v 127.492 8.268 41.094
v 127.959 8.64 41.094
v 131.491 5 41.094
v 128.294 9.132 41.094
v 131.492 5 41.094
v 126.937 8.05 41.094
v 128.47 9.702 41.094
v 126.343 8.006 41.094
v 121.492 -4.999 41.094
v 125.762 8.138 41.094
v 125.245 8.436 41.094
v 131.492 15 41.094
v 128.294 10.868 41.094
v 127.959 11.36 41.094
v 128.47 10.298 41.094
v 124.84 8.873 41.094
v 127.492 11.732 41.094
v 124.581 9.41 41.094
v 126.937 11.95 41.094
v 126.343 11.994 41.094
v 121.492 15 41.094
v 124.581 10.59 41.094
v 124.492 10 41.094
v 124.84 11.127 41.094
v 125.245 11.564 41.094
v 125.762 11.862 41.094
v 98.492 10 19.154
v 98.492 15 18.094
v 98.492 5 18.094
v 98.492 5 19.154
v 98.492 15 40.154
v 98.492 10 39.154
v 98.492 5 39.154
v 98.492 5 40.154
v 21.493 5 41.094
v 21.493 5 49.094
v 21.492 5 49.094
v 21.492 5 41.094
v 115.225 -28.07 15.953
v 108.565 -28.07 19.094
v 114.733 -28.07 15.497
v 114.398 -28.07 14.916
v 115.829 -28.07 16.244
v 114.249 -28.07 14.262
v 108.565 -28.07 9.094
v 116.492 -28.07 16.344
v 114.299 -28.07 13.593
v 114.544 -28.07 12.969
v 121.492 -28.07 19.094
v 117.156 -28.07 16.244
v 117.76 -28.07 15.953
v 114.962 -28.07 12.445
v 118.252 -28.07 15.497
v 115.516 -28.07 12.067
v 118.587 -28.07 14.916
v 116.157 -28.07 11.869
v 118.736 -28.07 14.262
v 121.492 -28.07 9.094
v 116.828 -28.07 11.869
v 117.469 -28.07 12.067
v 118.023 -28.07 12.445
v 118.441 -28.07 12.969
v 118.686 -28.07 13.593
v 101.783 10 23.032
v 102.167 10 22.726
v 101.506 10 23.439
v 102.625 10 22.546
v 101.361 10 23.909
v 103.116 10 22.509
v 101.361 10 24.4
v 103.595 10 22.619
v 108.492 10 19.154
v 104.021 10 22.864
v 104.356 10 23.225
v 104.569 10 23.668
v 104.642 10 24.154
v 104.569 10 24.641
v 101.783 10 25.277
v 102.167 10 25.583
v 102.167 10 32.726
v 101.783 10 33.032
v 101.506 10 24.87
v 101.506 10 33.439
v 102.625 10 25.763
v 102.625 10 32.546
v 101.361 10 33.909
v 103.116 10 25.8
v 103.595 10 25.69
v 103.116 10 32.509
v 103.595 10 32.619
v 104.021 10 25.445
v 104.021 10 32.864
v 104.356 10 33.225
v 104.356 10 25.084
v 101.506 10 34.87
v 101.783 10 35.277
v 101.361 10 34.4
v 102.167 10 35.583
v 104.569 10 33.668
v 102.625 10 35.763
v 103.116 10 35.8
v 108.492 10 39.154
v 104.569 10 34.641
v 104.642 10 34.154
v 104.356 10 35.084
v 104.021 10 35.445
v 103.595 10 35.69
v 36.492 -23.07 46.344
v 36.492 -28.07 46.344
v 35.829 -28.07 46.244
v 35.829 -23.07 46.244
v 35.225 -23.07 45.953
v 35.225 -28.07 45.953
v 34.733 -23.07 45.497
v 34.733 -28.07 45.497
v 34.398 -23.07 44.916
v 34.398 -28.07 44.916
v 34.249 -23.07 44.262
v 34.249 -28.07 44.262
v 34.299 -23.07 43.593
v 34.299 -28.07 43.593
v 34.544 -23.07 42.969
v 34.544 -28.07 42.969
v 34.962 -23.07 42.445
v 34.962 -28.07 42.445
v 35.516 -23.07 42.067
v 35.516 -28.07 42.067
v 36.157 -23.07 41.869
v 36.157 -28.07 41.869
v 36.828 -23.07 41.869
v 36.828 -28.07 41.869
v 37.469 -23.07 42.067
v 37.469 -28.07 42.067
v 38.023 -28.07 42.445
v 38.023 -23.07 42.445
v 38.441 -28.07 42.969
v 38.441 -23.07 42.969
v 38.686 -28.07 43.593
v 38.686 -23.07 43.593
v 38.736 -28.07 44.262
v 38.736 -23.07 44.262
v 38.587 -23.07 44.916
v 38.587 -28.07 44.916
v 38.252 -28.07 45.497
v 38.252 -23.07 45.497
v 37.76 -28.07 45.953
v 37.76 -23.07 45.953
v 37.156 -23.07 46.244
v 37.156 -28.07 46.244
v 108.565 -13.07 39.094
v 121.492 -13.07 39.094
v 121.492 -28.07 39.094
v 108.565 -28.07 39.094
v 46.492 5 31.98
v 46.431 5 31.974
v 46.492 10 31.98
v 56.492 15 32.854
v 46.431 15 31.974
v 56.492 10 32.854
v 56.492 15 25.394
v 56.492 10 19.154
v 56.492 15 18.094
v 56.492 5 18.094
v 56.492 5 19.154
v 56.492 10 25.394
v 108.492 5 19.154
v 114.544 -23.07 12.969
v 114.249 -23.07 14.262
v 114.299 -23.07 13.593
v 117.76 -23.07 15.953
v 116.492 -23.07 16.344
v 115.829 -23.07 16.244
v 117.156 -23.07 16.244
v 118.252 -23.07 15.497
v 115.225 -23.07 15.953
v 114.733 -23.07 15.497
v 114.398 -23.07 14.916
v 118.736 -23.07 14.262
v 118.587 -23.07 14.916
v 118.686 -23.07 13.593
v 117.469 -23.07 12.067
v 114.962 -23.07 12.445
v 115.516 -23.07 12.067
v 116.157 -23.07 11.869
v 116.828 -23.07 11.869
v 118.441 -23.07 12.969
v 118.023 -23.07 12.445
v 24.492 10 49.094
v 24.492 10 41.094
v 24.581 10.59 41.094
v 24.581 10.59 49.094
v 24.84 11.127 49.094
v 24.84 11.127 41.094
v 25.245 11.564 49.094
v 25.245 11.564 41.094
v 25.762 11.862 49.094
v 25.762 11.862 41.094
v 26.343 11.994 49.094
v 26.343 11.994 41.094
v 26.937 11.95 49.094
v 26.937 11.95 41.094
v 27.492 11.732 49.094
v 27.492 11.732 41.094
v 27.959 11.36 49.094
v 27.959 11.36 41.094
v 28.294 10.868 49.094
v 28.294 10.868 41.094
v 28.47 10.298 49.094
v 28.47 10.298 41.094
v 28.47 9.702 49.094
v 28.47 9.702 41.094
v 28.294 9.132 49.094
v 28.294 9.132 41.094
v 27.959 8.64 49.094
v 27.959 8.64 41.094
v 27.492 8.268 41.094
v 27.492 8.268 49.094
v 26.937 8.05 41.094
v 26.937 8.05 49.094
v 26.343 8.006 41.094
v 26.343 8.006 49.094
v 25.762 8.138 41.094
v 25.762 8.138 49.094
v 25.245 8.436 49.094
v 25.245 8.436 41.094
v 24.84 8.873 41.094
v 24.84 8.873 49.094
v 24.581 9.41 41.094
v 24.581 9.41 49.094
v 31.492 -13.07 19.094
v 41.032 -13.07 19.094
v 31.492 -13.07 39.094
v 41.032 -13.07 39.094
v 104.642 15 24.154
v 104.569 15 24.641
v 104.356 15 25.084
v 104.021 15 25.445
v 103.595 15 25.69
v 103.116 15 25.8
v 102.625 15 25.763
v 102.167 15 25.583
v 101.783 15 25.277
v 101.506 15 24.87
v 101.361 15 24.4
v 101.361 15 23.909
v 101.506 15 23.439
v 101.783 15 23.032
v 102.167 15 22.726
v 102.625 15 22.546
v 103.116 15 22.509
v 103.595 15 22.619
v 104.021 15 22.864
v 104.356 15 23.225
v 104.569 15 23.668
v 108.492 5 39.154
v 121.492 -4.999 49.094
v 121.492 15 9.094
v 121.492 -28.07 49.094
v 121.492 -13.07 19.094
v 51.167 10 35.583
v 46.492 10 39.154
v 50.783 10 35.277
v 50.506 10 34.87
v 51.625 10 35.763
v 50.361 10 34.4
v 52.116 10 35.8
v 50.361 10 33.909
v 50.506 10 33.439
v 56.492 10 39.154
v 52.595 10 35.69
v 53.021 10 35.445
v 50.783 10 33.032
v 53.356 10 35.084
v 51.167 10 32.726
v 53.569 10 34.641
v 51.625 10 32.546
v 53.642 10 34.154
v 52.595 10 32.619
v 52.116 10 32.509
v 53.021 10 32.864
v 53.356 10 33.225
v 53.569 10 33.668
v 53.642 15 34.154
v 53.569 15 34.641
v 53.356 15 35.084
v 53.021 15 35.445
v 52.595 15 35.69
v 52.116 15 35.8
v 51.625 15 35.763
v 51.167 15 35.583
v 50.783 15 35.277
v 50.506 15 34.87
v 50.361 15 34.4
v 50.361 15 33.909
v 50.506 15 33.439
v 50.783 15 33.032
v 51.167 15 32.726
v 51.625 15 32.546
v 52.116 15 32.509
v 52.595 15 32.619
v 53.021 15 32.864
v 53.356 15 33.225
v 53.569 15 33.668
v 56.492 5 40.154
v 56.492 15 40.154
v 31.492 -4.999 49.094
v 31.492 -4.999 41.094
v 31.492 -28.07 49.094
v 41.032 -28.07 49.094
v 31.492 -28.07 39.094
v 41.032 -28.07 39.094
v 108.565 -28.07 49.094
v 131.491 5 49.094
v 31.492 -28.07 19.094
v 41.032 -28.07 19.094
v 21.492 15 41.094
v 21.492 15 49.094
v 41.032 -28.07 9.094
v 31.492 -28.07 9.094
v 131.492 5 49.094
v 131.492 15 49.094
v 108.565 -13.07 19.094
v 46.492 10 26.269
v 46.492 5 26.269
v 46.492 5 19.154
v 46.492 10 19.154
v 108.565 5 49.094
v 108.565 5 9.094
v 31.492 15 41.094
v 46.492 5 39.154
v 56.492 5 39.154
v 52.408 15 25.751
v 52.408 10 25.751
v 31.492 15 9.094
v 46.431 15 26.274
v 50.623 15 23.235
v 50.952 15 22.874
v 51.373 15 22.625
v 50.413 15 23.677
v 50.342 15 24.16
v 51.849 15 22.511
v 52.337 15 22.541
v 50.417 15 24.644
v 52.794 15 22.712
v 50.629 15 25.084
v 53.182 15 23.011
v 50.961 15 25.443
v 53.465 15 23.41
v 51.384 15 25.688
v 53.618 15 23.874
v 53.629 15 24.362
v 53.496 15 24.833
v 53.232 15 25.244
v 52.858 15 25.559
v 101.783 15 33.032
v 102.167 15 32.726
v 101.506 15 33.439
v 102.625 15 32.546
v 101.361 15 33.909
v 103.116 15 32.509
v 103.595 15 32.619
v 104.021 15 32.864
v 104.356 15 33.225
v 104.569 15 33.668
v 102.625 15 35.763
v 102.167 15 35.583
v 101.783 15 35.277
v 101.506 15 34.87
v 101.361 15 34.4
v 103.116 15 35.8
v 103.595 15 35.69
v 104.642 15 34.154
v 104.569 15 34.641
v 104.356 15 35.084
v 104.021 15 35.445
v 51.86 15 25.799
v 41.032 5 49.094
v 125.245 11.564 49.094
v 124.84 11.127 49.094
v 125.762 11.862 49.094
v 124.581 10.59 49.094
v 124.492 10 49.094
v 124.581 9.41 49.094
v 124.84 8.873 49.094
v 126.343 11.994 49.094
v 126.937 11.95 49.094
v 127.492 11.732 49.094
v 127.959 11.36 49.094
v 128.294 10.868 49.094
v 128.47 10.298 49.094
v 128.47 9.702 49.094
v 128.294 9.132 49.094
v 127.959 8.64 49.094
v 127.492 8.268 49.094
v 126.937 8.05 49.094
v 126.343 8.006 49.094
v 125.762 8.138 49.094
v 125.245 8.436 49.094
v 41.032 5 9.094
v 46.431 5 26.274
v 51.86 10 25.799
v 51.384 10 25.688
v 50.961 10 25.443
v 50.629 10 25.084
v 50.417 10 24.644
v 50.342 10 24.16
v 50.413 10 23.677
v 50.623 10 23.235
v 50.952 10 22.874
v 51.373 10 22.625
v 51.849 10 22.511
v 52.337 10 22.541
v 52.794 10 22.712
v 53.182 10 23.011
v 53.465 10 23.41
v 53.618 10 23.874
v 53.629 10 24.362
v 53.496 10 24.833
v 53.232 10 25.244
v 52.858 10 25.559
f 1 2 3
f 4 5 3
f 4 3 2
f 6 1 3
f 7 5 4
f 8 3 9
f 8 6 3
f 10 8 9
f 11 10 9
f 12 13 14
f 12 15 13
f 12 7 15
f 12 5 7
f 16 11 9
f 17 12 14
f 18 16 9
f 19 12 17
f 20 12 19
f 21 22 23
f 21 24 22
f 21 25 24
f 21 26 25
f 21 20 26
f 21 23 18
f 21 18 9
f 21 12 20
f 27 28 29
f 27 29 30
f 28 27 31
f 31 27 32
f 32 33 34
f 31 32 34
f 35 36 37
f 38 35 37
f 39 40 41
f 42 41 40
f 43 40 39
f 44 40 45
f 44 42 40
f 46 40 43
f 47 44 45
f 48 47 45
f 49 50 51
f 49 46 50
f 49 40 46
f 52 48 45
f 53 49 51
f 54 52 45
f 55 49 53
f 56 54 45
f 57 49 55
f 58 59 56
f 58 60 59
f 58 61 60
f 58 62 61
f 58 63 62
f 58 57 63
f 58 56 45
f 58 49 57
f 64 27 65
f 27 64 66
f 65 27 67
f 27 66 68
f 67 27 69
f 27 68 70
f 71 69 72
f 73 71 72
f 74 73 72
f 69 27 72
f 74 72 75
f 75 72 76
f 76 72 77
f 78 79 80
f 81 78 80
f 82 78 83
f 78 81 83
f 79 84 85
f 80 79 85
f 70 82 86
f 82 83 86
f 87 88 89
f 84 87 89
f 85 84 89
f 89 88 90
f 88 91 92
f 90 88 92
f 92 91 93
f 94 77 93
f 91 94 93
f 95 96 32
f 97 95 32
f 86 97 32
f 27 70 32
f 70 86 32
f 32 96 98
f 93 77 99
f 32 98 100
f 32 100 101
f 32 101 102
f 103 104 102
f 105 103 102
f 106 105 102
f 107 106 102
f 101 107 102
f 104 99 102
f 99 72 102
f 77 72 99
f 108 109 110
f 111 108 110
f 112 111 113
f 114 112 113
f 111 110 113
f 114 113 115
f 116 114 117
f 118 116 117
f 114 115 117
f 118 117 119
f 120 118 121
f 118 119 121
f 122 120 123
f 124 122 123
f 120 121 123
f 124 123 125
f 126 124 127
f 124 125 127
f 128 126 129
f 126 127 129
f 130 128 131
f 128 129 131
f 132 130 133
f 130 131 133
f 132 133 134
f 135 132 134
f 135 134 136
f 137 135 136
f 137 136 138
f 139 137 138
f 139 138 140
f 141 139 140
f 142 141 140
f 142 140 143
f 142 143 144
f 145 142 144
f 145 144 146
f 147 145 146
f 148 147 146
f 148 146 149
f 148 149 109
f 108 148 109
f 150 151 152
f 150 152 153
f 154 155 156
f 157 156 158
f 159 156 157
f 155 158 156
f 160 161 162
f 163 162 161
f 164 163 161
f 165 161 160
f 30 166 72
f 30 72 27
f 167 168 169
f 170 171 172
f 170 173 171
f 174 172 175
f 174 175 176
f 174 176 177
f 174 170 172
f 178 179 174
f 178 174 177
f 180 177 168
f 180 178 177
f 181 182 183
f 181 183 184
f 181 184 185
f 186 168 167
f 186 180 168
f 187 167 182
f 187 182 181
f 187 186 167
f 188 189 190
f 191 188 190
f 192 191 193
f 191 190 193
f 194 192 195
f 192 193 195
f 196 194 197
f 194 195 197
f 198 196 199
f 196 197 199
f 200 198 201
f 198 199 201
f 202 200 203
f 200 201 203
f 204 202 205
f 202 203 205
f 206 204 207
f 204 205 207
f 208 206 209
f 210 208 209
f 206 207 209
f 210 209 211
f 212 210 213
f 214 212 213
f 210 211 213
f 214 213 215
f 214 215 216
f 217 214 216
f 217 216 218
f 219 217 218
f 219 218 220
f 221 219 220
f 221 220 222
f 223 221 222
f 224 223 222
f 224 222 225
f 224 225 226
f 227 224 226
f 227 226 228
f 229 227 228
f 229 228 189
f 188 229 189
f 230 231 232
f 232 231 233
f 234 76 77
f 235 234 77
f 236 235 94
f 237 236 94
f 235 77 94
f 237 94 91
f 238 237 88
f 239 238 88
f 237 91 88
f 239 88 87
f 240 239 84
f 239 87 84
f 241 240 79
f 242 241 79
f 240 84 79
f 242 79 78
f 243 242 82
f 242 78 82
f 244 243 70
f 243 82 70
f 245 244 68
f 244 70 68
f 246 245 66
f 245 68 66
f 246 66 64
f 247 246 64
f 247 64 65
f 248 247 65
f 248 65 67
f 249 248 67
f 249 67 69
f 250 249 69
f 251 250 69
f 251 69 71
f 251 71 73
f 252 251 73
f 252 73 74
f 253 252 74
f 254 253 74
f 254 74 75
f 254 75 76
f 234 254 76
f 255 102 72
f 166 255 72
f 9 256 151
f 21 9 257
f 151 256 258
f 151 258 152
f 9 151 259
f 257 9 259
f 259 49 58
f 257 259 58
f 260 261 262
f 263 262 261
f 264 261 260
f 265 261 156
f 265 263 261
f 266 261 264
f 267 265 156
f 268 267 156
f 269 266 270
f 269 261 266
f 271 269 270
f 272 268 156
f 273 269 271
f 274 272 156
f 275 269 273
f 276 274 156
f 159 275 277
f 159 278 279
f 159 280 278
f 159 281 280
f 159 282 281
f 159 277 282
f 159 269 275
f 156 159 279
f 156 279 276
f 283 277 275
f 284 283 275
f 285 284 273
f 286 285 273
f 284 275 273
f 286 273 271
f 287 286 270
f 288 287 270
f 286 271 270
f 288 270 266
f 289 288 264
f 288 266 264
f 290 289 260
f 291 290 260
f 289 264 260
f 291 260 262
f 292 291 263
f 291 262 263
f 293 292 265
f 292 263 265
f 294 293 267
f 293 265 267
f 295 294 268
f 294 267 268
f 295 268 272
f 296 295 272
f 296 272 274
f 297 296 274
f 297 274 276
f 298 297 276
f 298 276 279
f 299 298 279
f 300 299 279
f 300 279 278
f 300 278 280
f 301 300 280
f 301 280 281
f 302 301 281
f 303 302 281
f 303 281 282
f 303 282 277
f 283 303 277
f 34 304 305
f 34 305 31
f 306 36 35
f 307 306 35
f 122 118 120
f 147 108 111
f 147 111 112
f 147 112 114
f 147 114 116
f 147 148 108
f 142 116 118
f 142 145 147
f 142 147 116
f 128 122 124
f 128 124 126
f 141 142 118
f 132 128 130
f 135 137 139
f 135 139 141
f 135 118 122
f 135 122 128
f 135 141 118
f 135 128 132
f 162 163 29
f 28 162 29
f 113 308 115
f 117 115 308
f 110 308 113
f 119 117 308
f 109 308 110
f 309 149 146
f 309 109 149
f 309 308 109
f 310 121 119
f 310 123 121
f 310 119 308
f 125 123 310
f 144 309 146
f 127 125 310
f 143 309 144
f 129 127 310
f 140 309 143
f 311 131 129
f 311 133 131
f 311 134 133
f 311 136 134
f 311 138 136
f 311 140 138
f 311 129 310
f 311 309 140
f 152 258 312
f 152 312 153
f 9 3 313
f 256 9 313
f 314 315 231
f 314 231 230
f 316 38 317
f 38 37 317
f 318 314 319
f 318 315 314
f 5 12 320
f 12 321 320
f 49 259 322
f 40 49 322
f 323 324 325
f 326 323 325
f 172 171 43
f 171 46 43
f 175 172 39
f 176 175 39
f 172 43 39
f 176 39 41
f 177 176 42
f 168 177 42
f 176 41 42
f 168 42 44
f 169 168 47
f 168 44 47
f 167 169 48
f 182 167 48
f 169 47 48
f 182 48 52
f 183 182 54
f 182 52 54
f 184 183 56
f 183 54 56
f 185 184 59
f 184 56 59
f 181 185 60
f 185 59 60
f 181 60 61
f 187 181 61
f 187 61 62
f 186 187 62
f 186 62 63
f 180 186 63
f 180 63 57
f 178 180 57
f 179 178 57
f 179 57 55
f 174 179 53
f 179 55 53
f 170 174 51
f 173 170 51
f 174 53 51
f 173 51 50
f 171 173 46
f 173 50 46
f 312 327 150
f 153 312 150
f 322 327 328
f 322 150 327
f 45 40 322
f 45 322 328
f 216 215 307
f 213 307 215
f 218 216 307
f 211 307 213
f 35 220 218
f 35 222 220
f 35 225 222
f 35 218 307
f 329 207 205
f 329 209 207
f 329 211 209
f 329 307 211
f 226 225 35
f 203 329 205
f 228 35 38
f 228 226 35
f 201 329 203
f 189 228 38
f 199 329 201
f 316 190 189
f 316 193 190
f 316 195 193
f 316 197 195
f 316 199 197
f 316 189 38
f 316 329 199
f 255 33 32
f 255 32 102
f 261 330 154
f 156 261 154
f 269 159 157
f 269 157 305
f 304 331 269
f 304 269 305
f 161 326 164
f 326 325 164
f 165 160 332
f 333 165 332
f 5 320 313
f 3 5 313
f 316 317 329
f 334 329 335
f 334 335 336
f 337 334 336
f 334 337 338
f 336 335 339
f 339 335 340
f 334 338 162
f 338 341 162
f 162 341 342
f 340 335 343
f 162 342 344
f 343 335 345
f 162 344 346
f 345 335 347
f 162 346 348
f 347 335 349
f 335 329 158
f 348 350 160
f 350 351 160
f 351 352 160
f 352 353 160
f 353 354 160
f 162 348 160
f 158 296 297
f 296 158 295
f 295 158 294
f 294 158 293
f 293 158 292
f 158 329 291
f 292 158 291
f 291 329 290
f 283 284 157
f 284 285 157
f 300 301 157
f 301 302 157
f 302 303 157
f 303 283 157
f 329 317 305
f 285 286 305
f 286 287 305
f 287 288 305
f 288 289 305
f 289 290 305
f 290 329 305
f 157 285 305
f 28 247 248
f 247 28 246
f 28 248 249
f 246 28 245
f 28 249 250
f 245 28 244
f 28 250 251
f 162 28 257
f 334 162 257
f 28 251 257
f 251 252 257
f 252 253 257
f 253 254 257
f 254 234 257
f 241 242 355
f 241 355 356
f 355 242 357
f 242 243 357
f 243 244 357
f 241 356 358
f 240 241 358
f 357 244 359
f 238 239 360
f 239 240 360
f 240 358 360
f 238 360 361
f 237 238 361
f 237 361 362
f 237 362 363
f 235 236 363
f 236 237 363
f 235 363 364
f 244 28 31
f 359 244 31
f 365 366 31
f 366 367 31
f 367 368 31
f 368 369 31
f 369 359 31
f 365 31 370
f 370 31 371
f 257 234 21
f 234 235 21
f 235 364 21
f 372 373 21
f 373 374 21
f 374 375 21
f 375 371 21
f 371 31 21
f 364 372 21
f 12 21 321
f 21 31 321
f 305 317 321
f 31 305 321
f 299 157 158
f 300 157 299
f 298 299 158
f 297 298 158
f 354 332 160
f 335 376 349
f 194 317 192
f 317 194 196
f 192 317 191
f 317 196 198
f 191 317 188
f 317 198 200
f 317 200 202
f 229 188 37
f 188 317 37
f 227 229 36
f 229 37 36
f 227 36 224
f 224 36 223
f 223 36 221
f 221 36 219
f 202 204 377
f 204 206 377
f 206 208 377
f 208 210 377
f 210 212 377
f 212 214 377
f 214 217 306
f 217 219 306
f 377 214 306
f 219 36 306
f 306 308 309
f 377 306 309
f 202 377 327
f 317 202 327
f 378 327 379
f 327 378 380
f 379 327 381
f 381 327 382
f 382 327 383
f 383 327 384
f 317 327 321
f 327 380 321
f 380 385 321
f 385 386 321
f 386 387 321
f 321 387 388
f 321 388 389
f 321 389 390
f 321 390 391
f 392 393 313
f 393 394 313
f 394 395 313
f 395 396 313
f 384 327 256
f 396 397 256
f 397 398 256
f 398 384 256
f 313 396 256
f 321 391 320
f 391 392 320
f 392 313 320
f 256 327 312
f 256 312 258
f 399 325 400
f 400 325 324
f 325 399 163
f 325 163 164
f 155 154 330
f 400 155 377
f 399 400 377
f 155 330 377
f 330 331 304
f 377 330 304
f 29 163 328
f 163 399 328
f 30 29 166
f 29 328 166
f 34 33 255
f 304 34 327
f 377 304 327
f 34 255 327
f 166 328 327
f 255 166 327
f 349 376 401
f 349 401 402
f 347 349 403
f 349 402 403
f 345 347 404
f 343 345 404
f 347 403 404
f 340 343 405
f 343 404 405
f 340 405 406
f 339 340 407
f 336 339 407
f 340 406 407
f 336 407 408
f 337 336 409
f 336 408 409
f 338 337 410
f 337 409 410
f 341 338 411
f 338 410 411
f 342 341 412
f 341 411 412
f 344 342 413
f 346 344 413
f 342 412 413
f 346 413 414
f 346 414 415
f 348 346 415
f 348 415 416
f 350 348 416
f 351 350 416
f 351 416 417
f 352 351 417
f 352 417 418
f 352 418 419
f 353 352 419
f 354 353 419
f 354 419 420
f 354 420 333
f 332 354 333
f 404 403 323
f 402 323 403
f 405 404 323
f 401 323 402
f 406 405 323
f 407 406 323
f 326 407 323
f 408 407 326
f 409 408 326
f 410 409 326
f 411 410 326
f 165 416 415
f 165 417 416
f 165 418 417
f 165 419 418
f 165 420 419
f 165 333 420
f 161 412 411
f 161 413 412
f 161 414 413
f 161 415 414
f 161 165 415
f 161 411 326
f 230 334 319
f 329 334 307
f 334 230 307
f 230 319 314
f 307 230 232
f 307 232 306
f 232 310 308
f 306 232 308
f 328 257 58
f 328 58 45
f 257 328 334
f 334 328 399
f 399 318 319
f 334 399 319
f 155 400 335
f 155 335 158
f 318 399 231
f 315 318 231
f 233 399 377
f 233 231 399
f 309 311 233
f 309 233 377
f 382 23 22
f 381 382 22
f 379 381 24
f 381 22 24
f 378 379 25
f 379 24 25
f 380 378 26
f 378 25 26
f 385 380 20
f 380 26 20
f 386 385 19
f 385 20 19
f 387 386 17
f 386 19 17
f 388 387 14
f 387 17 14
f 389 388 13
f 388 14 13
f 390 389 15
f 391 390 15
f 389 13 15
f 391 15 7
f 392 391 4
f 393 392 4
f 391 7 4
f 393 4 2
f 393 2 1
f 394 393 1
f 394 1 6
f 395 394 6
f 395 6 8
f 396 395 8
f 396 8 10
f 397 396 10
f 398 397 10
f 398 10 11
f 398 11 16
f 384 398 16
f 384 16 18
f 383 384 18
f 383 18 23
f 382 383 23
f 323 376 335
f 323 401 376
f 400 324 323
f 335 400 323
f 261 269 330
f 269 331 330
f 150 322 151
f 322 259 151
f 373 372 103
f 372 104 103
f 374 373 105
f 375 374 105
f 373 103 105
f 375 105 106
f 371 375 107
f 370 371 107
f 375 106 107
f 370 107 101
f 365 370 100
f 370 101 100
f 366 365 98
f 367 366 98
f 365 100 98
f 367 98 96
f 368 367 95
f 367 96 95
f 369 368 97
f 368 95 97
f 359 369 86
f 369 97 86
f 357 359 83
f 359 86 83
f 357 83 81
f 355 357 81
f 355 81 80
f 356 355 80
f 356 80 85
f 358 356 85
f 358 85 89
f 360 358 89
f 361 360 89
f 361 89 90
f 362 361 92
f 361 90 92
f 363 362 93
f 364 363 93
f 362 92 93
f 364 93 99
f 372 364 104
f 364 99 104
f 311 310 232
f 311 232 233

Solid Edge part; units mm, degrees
sketch "Sketch1" plane through (0, 0, 0) normal (0, -1, 0) x (1, 0, 0)
  line L0 (31.4924, 49.0939) -> (121.4924, 49.0939)
  line L1 (121.4924, 49.0939) -> (121.4924, 9.0939)
  line L2 (121.4924, 9.0939) -> (31.4924, 9.0939)
  line L3 (31.4924, 9.0939) -> (31.4924, 49.0939)
  dimension "D1" = 90
  dimension "D2" = 40
extrude "Protrusion1" add sketch "Sketch1" against normal blind 40
sketch "Sketch2" plane through (64.4924, 0, 22.0939) normal (0, -1, 0) x (1, 0, 0)
  line L0 (-18.0616, 9.8803) -> (-8, 10.7605)
  line L1 (-8, 10.7605) -> (-8, 18.0605)
  line L2 (-8, 18.0605) -> (34, 18.0605)
  line L3 (34, -4) -> (34, 18.0605)
  line L4 (-8, -4) -> (34, -4)
  line L5 (-8, -4) -> (-8, 3.3)
  line L6 (-8, 3.3) -> (-18.0616, 4.1803)
  line L7 (-18.0616, 4.1803) -> (-18.0616, 9.8803)
extrude "ExtrudedCutout_4" cut sketch "Sketch2" against normal blind 37
sketch "Sketch3" plane through (31.4924, 20, 22.0939) normal (-1, 0, 0) x (0, -1, 0)
  line L0 (-17, 2) -> (-17, 12)
  line L1 (-17, 12) -> (-10, 12)
  line L2 (-10, 12) -> (-10, 2)
  line L3 (-10, 2) -> (-17, 2)
  dimension "D1" = 10
  dimension "D2" = 7
  dimension "D3" = 10
  dimension "D4" = 3
  dimension "D5" = 15
extrude "Cutout1" cut sketch "Sketch3" against normal up to next
sketch "Sketch4" plane through (64.4924, 0, 22.0939) normal (0, -1, 0) x (1, 0, 0)
  line L0 (-8, 17.0605) -> (-18, 17.0605)
  line L1 (-18, 17.0605) -> (-18, -2.9395)
  line L2 (-18, -2.9395) -> (-8, -2.9395)
  line L3 (-8, -2.9395) -> (-8, 17.0605)
  line L4 (34, 17.0605) -> (44, 17.0605)
  line L5 (44, 17.0605) -> (44, -2.9395)
  line L6 (44, -2.9395) -> (34, -2.9395)
  line L7 (34, -2.9395) -> (34, 17.0605)
  dimension "D1" = 1
  dimension "D2" = 20
  dimension "D3" = 1
  dimension "D4" = 10
  dimension "D5" = 20
  dimension "D6" = 10
extrude "ExtrudedCutout_6" cut sketch "Sketch4" against normal blind 10
sketch "Sketch5" plane through (91.2324, 10, 21.645) normal (0, -1, 0) x (1, 0, 0)
  circle A0 centre (11.76, 12.5095) radius 1.65
  circle A1 centre (-39.24, 12.5095) radius 1.65
  circle A2 centre (-39.24, 2.5095) radius 1.65
  circle A3 centre (11.76, 2.5095) radius 1.65
  dimension "D1" = 4.5
  dimension "D2" = 3.3
  dimension "D3" = 4.5
  dimension "D4" = 10
  dimension "D5" = 5
  dimension "D6" = 10
  dimension "D7" = 5
extrude "Cutout2" cut sketch "Sketch5" against normal through all
sketch "Sketch6" plane through (68.9924, 0, 22.0939) normal (0, -1, 0) x (1, 0, 0)
  line L0 (-37.5, 27) -> (-37.5, -13)
  line L1 (-37.5, -13) -> (52.5, -13)
  line L2 (52.5, -13) -> (52.5, 27)
  line L3 (52.5, 27) -> (-37.5, 27)
  line L4 (-22.5616, 13.0605) -> (-22.5616, 18.0605)
  line L5 (-22.5616, 18.0605) -> (39.5, 18.0605)
  line L6 (39.5, 18.0605) -> (39.5, -4)
  line L7 (39.5, -4) -> (-22.5616, -4)
  line L8 (-22.5616, 13.0605) -> (-22.5616, -4)
extrude "ExtrudedProtrusion_4" add sketch "Sketch6" along normal blind 28.07
sketch "Sketch7" plane through (68.9924, -28.07, 22.0939) normal (0, -1, 0) x (1, 0, 0)
  circle A0 centre (-4.46, 7) radius 23.5
  dimension "D1" = 33.04
  dimension "D2" = 47
extrude "ExtrudedCutout_9" cut sketch "Sketch7" against normal blind 33.07
sketch "Sketch8" plane through (41.8429, -28.07, 29.0939) normal (0, -1, 0) x (0, 0, 1)
  line L0 (0, 10.3505) -> (5, 10.3505)
  line L1 (5, 10.3505) -> (5, -79.6495)
  line L2 (5, -79.6495) -> (0, -79.6495)
  line L3 (0, -79.6495) -> (-5, -79.6495)
  line L4 (-5, -79.6495) -> (-5, 10.3505)
  line L5 (-5, 10.3505) -> (0, 10.3505)
  dimension "D1" = 5
  dimension "D2" = 5
extrude "Cutout3" cut sketch "Sketch8" against normal blind 15
sketch "Sketch9" plane through (41.8429, -28.07, 41.5939) normal (0, -1, 0) x (0, 0, 1)
  circle A0 centre (2.5, 5.3505) radius 2.25
  circle A1 centre (-27.5, -74.6495) radius 2.25
  dimension "D1" = 5
  dimension "D2" = 5
  dimension "D3" = 4.5
  dimension "D4" = 5
  dimension "D5" = 5
extrude "ExtrudedCutout_13" cut sketch "Sketch9" against normal blind 5
sketch "Sketch10" plane through (76.4924, 5.965, 49.0939) normal (0, 0, 1) x (-1, 0, 0)
  line L0 (-0.379, 0.965) -> (24.299, 0.965)
  line L1 (24.299, 0.965) -> (45, 0.965)
  line L2 (45, 0.965) -> (55, 0.965)
  line L3 (55, 0.965) -> (55, -9.035)
  line L4 (55, -9.035) -> (45, -9.035)
  line L5 (45, -9.035) -> (-45, -9.035)
  line L6 (-45, -9.035) -> (-55, -9.035)
  line L7 (-55, -9.035) -> (-55, 0.965)
  line L8 (-55, 0.965) -> (-45, 0.965)
  line L9 (-45, 0.965) -> (-0.379, 0.965)
  dimension "D1" = 10
  dimension "D2" = 10
  dimension "D3" = 10
  dimension "D4" = 10
extrude "ExtrudedProtrusion_9" add sketch "Sketch10" against normal blind 8
sketch "Sketch11" plane through (26.4924, 10, 41.0939) normal (0, 0, -1) x (-1, 0, 0)
  circle A0 centre (0, 0) radius 2
  circle A1 centre (-100, 0) radius 2
  dimension "D1" = 4
  dimension "D2" = 5
  dimension "D3" = 5
  dimension "D4" = 4
  dimension "D5" = 5
  dimension "D6" = 5
extrude "Cutout4" cut sketch "Sketch11" against normal through all
chamfer "Chamfer_1" distance 10 angle 45 1 edges at (31.4924, 15, 45.0939)
chamfer "Chamfer_2" distance 10 angle 45 1 edges at (31.4924, 5, 45.0939)
chamfer "Chamfer_3" distance 10 angle 45 1 edges at (121.4924, 15, 45.0939)
chamfer "Chamfer_4" distance 10 angle 45 1 edges at (121.4924, 5, 45.0939)
sketch "Sketch12" plane through (76.4924, 5.965, 49.0939) normal (0, 0, 1) x (1, 0, 0)
  line L0 (-55, 9.035) -> (55, 9.035)
  line L1 (55, 9.035) -> (45, 34.035)
  line L2 (45, 34.035) -> (-45, 34.035)
  line L3 (-45, 34.035) -> (-55, 9.035)
extrude "Cutout5" cut sketch "Sketch12" against normal through all
sketch "Sketch13" plane through (99.1819, -28.07, 41.5939) normal (0, -1, 0) x (1, 0, 0)
  line L0 (-58.1495, -12.5) -> (-58.1495, 7.5)
  line L1 (-58.1495, 7.5) -> (0, 7.5)
  line L2 (0, 7.5) -> (9.3829, 7.5)
  line L3 (9.3829, 7.5) -> (9.3829, -32.5)
  line L4 (-58.1495, -32.5) -> (9.3829, -32.5)
  line L5 (-58.1495, -12.5) -> (-58.1495, -32.5)
extrude "Cutout6" cut sketch "Sketch13" against normal up to vertex (33.07 mm away)
sketch "Sketch14" plane through (36.2624, -28.07, 41.5939) normal (0, -1, 0) x (0, 0, -1)
  line L0 (2.5, -4.77) -> (2.5, 4.77)
  line L1 (2.5, 4.77) -> (7.5, 4.77)
  line L2 (7.5, 4.77) -> (7.5, -4.77)
  line L3 (7.5, -4.77) -> (2.5, -4.77)
extrude "Cutout7" cut sketch "Sketch14" against normal up to vertex (15 mm away)
sketch "Sketch15" plane through (36.2624, -28.07, 41.5939) normal (0, -1, 0) x (0, 0, -1)
  line L0 (22.5, 4.77) -> (22.5, -4.77)
  line L1 (22.5, -4.77) -> (17.5, -4.77)
  line L2 (17.5, -4.77) -> (17.5, 4.77)
  line L3 (17.5, 4.77) -> (22.5, 4.77)
extrude "Cutout8" cut sketch "Sketch15" against normal up to vertex (15 mm away)
sketch "Sketch16" plane through (36.2624, -28.07, 41.5939) normal (0, -1, 0) x (0, 0, -1)
  line L0 (2.5, 85.23) -> (7.5, 85.23)
  line L1 (7.5, 85.23) -> (7.5, 72.3024)
  line L2 (2.5, 72.3024) -> (7.5, 72.3024)
  line L3 (2.5, 85.23) -> (2.5, 72.3024)
extrude "Cutout9" cut sketch "Sketch16" against normal up to vertex (15 mm away)
sketch "Sketch17" plane through (36.2624, -28.07, 41.5939) normal (0, -1, 0) x (0, 0, -1)
  line L0 (22.5, 85.23) -> (22.5, 72.3024)
  line L1 (22.5, 72.3024) -> (17.5, 72.3024)
  line L2 (17.5, 72.3024) -> (17.5, 85.23)
  line L3 (17.5, 85.23) -> (22.5, 85.23)
extrude "Cutout10" cut sketch "Sketch17" against normal up to vertex (15 mm away)
